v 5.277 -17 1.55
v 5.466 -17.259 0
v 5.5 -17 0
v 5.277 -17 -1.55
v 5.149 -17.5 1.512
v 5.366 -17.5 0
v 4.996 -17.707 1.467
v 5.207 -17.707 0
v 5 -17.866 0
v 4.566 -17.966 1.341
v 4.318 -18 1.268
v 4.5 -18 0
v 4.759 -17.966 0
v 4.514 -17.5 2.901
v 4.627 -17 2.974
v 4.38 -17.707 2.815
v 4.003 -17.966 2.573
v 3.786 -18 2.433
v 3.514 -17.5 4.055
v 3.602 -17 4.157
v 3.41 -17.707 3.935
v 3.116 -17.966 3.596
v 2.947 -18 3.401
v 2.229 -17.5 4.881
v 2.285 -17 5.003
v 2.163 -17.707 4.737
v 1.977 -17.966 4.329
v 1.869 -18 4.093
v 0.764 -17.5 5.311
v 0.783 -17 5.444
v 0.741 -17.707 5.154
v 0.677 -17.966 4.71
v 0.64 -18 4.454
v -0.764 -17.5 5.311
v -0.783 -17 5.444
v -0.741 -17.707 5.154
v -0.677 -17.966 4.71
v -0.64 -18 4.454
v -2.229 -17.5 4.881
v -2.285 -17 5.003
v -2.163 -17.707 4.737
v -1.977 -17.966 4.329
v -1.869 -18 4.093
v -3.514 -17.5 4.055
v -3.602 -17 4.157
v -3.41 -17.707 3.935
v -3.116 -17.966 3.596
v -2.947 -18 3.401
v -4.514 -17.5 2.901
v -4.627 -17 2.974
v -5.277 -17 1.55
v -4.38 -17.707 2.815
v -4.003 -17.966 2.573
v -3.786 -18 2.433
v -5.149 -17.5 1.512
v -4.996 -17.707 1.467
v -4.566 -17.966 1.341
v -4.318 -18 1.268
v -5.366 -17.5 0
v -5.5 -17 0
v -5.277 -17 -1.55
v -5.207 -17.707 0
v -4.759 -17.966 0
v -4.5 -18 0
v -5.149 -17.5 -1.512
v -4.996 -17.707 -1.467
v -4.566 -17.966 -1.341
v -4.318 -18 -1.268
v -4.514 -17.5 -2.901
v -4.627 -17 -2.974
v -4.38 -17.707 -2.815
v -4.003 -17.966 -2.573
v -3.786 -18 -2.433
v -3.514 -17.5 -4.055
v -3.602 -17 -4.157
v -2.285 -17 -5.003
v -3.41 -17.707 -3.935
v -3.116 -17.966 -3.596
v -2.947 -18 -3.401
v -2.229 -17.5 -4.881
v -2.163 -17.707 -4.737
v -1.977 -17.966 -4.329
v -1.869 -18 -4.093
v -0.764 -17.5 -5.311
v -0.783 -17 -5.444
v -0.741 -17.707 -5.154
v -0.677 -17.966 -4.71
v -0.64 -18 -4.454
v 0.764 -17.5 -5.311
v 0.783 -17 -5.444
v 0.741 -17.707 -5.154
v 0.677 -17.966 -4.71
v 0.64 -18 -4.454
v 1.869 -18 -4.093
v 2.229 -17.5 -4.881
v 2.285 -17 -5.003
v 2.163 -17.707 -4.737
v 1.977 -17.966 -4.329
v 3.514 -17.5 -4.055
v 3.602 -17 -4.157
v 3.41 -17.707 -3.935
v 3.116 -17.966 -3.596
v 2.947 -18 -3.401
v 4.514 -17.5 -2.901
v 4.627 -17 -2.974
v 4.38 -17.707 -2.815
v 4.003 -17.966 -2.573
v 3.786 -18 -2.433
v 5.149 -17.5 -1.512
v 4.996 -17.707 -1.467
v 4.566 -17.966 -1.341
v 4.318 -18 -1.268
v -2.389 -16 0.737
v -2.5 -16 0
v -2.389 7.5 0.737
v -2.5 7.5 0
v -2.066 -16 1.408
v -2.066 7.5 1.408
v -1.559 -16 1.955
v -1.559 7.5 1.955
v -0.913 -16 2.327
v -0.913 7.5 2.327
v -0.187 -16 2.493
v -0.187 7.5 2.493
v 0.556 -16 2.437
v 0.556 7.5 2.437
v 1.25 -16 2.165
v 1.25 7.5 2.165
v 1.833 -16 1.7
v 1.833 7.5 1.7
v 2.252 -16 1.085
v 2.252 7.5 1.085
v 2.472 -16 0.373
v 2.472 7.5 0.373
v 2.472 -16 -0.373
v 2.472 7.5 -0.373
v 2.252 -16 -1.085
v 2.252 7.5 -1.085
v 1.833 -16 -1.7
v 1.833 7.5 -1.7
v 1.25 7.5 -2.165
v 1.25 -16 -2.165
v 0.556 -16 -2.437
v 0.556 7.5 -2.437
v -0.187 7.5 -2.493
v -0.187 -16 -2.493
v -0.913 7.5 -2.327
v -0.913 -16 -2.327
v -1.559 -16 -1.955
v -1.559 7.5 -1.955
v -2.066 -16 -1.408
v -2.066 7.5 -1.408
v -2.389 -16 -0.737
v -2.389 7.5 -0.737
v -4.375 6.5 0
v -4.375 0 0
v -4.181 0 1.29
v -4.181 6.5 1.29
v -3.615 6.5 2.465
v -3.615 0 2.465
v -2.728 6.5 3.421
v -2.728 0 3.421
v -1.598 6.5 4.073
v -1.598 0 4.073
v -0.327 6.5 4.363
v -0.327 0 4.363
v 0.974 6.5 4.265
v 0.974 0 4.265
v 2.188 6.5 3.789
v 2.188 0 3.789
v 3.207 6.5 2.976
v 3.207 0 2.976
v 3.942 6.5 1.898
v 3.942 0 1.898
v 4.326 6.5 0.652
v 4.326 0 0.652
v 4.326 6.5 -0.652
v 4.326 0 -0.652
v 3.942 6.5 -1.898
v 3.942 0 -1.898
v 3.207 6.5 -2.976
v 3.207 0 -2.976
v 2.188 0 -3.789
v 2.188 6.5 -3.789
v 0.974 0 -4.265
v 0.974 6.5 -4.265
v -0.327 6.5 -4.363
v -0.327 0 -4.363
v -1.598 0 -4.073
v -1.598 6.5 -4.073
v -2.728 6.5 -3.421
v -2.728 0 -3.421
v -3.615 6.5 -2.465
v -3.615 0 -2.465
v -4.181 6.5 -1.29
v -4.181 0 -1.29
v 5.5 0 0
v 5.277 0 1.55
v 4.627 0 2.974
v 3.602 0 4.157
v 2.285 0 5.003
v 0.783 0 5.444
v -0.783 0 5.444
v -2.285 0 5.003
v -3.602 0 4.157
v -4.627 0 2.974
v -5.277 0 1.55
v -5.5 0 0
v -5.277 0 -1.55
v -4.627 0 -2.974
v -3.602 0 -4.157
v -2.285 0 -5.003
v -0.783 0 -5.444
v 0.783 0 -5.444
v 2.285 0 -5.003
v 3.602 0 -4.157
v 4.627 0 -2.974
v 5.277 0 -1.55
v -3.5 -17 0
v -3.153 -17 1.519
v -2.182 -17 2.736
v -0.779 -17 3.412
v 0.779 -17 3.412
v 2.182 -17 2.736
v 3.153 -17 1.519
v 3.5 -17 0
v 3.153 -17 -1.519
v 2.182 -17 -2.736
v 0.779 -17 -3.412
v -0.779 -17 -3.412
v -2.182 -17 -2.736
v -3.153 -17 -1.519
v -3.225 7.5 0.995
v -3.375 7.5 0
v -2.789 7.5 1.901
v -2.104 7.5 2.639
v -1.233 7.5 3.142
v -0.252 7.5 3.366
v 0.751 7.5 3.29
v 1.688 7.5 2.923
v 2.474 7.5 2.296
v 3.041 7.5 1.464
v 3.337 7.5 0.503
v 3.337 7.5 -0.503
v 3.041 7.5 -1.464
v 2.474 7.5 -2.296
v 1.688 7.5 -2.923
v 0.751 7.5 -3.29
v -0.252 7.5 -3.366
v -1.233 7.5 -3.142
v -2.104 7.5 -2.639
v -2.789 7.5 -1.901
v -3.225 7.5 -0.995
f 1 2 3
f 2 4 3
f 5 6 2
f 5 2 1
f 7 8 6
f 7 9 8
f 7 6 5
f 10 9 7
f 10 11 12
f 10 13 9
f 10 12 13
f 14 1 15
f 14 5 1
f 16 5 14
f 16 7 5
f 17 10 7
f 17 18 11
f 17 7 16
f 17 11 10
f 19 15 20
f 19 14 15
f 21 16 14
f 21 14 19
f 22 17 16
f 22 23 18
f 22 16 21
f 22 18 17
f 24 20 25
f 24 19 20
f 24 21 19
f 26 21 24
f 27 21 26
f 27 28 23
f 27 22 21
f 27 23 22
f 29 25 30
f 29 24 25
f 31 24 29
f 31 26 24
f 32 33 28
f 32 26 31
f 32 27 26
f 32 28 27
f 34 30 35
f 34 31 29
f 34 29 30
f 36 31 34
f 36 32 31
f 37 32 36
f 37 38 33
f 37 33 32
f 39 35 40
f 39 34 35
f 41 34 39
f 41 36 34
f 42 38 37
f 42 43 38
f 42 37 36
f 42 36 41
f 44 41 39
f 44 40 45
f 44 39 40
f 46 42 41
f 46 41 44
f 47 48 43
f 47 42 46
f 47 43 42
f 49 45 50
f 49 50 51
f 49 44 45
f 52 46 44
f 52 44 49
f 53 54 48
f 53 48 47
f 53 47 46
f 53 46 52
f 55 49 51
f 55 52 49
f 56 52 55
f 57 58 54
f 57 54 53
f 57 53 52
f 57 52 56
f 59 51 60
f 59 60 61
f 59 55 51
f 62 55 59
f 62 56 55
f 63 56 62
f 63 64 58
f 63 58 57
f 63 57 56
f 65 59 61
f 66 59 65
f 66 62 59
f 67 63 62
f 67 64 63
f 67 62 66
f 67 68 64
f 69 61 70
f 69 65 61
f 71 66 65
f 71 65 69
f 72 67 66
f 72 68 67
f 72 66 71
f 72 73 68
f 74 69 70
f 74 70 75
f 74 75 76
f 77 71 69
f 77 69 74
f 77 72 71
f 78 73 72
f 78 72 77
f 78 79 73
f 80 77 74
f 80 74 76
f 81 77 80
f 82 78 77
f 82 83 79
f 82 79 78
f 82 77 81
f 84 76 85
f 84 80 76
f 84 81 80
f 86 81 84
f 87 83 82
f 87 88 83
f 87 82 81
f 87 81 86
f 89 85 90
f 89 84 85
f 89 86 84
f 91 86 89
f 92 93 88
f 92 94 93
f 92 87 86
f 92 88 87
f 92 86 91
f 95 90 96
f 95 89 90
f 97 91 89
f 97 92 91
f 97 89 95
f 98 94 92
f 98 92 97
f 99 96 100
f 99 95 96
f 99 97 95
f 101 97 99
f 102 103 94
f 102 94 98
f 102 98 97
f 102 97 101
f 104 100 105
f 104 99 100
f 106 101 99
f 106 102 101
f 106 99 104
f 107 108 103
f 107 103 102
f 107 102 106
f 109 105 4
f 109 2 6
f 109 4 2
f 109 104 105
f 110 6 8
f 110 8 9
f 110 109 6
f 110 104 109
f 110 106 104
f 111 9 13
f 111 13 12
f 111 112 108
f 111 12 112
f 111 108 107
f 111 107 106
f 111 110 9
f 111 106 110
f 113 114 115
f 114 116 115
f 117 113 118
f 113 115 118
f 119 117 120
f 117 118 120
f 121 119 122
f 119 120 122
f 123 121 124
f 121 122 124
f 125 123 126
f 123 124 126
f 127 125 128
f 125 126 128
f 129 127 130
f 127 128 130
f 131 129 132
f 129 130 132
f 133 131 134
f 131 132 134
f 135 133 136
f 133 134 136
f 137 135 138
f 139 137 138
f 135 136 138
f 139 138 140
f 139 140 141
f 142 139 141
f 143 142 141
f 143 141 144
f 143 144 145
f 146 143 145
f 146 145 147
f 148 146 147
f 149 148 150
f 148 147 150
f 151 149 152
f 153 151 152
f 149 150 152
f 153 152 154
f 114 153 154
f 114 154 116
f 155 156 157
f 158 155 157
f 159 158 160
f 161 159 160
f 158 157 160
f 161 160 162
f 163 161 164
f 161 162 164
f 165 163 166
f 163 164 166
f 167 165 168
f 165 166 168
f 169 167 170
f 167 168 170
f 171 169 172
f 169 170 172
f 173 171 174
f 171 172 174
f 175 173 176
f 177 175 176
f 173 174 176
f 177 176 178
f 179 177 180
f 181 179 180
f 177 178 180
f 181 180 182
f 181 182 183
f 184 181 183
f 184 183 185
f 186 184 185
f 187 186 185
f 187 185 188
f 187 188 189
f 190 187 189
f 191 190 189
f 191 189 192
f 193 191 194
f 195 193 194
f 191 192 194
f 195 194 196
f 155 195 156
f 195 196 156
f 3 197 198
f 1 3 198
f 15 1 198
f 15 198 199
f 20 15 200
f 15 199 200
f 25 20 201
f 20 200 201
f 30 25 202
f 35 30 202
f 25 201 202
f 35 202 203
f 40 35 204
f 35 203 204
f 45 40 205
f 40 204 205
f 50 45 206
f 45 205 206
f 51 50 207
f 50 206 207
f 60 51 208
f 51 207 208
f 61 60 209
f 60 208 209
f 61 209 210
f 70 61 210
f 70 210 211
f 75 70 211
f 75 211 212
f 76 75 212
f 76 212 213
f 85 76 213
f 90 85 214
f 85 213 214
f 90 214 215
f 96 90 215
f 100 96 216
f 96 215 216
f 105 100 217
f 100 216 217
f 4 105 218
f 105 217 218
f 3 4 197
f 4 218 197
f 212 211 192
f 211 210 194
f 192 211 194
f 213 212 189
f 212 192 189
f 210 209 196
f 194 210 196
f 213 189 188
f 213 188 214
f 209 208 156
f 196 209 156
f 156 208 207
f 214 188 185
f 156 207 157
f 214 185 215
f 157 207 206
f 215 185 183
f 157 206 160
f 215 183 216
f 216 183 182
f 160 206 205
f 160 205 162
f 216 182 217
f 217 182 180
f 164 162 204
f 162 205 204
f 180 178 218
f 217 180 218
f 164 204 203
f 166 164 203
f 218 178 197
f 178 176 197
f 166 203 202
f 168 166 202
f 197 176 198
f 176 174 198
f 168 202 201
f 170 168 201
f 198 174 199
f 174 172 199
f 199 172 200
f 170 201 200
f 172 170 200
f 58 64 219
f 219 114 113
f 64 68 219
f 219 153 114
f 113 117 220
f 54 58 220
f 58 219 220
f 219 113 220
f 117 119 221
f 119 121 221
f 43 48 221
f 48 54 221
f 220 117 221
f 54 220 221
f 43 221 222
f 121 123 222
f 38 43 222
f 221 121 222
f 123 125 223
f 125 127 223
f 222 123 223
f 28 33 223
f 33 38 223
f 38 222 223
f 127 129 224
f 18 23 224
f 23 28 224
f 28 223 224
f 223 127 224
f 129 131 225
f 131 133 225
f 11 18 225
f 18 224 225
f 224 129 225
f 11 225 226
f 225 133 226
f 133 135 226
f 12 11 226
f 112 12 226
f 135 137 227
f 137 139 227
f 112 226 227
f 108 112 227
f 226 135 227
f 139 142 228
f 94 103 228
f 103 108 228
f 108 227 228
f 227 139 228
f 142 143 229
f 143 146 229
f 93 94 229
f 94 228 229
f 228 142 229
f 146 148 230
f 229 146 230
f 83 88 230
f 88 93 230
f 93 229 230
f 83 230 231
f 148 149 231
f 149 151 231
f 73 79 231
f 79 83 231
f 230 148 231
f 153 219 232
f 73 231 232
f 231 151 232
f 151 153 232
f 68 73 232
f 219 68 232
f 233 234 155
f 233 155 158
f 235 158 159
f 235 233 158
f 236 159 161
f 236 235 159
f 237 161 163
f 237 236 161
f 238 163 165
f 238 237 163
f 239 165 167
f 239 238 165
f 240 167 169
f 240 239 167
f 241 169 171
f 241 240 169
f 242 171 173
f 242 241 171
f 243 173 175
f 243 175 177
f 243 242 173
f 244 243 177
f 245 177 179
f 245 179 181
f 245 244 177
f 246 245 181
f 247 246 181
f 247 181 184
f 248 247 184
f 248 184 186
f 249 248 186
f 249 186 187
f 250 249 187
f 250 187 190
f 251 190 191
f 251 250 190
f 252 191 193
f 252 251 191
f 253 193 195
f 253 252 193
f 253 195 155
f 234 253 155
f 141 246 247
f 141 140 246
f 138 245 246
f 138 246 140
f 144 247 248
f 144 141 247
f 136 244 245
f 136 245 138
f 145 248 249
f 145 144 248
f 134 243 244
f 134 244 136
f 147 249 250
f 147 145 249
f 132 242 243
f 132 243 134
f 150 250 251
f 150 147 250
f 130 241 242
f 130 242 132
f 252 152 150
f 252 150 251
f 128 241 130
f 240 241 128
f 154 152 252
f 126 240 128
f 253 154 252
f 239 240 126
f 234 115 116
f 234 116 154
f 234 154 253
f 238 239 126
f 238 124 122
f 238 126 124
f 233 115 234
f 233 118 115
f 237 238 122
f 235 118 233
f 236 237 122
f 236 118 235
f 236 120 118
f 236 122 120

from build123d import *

# Parameters (mm, degrees)
F0_R           = 5.5
F1_DEPTH       = 18
F2_R           = 1
F3_R           = 4.375
F4_DEPTH       = 7.5
F5_SIZE        = 1
F7_D           = 5
F7_CSINK_D     = 9
F7_CSINK_ANGLE = 90


with BuildPart() as f1:
    # F0 (on Front) → F1 (new body)
    with BuildSketch(Plane.XZ):
        Circle(F0_R)
    extrude(amount=F1_DEPTH)

    # F2
    f2_edges = [f1.edges().sort_by_distance(p)[0] for p in [
        (-5.5, -18, 0),
    ]]
    fillet(f2_edges, radius=F2_R)

    # F3 (on face) → F4 (join)
    with BuildSketch(Plane(origin=(0, 0, 0), x_dir=(-1, 0, 0), z_dir=(0, 1, 0))):
        Circle(F3_R)
    extrude(amount=F4_DEPTH)

    # F5
    f5_edges = [f1.edges().sort_by_distance(p)[0] for p in [
        (4.375, 7.5, 0),
    ]]
    chamfer(f5_edges, length=F5_SIZE)

    # F7 (through all)
    with Locations(Plane.XZ.offset(18)):
        with Locations((0, 0)):
            CounterSinkHole(F7_D / 2, F7_CSINK_D / 2, counter_sink_angle=F7_CSINK_ANGLE)


solid = f1.part
